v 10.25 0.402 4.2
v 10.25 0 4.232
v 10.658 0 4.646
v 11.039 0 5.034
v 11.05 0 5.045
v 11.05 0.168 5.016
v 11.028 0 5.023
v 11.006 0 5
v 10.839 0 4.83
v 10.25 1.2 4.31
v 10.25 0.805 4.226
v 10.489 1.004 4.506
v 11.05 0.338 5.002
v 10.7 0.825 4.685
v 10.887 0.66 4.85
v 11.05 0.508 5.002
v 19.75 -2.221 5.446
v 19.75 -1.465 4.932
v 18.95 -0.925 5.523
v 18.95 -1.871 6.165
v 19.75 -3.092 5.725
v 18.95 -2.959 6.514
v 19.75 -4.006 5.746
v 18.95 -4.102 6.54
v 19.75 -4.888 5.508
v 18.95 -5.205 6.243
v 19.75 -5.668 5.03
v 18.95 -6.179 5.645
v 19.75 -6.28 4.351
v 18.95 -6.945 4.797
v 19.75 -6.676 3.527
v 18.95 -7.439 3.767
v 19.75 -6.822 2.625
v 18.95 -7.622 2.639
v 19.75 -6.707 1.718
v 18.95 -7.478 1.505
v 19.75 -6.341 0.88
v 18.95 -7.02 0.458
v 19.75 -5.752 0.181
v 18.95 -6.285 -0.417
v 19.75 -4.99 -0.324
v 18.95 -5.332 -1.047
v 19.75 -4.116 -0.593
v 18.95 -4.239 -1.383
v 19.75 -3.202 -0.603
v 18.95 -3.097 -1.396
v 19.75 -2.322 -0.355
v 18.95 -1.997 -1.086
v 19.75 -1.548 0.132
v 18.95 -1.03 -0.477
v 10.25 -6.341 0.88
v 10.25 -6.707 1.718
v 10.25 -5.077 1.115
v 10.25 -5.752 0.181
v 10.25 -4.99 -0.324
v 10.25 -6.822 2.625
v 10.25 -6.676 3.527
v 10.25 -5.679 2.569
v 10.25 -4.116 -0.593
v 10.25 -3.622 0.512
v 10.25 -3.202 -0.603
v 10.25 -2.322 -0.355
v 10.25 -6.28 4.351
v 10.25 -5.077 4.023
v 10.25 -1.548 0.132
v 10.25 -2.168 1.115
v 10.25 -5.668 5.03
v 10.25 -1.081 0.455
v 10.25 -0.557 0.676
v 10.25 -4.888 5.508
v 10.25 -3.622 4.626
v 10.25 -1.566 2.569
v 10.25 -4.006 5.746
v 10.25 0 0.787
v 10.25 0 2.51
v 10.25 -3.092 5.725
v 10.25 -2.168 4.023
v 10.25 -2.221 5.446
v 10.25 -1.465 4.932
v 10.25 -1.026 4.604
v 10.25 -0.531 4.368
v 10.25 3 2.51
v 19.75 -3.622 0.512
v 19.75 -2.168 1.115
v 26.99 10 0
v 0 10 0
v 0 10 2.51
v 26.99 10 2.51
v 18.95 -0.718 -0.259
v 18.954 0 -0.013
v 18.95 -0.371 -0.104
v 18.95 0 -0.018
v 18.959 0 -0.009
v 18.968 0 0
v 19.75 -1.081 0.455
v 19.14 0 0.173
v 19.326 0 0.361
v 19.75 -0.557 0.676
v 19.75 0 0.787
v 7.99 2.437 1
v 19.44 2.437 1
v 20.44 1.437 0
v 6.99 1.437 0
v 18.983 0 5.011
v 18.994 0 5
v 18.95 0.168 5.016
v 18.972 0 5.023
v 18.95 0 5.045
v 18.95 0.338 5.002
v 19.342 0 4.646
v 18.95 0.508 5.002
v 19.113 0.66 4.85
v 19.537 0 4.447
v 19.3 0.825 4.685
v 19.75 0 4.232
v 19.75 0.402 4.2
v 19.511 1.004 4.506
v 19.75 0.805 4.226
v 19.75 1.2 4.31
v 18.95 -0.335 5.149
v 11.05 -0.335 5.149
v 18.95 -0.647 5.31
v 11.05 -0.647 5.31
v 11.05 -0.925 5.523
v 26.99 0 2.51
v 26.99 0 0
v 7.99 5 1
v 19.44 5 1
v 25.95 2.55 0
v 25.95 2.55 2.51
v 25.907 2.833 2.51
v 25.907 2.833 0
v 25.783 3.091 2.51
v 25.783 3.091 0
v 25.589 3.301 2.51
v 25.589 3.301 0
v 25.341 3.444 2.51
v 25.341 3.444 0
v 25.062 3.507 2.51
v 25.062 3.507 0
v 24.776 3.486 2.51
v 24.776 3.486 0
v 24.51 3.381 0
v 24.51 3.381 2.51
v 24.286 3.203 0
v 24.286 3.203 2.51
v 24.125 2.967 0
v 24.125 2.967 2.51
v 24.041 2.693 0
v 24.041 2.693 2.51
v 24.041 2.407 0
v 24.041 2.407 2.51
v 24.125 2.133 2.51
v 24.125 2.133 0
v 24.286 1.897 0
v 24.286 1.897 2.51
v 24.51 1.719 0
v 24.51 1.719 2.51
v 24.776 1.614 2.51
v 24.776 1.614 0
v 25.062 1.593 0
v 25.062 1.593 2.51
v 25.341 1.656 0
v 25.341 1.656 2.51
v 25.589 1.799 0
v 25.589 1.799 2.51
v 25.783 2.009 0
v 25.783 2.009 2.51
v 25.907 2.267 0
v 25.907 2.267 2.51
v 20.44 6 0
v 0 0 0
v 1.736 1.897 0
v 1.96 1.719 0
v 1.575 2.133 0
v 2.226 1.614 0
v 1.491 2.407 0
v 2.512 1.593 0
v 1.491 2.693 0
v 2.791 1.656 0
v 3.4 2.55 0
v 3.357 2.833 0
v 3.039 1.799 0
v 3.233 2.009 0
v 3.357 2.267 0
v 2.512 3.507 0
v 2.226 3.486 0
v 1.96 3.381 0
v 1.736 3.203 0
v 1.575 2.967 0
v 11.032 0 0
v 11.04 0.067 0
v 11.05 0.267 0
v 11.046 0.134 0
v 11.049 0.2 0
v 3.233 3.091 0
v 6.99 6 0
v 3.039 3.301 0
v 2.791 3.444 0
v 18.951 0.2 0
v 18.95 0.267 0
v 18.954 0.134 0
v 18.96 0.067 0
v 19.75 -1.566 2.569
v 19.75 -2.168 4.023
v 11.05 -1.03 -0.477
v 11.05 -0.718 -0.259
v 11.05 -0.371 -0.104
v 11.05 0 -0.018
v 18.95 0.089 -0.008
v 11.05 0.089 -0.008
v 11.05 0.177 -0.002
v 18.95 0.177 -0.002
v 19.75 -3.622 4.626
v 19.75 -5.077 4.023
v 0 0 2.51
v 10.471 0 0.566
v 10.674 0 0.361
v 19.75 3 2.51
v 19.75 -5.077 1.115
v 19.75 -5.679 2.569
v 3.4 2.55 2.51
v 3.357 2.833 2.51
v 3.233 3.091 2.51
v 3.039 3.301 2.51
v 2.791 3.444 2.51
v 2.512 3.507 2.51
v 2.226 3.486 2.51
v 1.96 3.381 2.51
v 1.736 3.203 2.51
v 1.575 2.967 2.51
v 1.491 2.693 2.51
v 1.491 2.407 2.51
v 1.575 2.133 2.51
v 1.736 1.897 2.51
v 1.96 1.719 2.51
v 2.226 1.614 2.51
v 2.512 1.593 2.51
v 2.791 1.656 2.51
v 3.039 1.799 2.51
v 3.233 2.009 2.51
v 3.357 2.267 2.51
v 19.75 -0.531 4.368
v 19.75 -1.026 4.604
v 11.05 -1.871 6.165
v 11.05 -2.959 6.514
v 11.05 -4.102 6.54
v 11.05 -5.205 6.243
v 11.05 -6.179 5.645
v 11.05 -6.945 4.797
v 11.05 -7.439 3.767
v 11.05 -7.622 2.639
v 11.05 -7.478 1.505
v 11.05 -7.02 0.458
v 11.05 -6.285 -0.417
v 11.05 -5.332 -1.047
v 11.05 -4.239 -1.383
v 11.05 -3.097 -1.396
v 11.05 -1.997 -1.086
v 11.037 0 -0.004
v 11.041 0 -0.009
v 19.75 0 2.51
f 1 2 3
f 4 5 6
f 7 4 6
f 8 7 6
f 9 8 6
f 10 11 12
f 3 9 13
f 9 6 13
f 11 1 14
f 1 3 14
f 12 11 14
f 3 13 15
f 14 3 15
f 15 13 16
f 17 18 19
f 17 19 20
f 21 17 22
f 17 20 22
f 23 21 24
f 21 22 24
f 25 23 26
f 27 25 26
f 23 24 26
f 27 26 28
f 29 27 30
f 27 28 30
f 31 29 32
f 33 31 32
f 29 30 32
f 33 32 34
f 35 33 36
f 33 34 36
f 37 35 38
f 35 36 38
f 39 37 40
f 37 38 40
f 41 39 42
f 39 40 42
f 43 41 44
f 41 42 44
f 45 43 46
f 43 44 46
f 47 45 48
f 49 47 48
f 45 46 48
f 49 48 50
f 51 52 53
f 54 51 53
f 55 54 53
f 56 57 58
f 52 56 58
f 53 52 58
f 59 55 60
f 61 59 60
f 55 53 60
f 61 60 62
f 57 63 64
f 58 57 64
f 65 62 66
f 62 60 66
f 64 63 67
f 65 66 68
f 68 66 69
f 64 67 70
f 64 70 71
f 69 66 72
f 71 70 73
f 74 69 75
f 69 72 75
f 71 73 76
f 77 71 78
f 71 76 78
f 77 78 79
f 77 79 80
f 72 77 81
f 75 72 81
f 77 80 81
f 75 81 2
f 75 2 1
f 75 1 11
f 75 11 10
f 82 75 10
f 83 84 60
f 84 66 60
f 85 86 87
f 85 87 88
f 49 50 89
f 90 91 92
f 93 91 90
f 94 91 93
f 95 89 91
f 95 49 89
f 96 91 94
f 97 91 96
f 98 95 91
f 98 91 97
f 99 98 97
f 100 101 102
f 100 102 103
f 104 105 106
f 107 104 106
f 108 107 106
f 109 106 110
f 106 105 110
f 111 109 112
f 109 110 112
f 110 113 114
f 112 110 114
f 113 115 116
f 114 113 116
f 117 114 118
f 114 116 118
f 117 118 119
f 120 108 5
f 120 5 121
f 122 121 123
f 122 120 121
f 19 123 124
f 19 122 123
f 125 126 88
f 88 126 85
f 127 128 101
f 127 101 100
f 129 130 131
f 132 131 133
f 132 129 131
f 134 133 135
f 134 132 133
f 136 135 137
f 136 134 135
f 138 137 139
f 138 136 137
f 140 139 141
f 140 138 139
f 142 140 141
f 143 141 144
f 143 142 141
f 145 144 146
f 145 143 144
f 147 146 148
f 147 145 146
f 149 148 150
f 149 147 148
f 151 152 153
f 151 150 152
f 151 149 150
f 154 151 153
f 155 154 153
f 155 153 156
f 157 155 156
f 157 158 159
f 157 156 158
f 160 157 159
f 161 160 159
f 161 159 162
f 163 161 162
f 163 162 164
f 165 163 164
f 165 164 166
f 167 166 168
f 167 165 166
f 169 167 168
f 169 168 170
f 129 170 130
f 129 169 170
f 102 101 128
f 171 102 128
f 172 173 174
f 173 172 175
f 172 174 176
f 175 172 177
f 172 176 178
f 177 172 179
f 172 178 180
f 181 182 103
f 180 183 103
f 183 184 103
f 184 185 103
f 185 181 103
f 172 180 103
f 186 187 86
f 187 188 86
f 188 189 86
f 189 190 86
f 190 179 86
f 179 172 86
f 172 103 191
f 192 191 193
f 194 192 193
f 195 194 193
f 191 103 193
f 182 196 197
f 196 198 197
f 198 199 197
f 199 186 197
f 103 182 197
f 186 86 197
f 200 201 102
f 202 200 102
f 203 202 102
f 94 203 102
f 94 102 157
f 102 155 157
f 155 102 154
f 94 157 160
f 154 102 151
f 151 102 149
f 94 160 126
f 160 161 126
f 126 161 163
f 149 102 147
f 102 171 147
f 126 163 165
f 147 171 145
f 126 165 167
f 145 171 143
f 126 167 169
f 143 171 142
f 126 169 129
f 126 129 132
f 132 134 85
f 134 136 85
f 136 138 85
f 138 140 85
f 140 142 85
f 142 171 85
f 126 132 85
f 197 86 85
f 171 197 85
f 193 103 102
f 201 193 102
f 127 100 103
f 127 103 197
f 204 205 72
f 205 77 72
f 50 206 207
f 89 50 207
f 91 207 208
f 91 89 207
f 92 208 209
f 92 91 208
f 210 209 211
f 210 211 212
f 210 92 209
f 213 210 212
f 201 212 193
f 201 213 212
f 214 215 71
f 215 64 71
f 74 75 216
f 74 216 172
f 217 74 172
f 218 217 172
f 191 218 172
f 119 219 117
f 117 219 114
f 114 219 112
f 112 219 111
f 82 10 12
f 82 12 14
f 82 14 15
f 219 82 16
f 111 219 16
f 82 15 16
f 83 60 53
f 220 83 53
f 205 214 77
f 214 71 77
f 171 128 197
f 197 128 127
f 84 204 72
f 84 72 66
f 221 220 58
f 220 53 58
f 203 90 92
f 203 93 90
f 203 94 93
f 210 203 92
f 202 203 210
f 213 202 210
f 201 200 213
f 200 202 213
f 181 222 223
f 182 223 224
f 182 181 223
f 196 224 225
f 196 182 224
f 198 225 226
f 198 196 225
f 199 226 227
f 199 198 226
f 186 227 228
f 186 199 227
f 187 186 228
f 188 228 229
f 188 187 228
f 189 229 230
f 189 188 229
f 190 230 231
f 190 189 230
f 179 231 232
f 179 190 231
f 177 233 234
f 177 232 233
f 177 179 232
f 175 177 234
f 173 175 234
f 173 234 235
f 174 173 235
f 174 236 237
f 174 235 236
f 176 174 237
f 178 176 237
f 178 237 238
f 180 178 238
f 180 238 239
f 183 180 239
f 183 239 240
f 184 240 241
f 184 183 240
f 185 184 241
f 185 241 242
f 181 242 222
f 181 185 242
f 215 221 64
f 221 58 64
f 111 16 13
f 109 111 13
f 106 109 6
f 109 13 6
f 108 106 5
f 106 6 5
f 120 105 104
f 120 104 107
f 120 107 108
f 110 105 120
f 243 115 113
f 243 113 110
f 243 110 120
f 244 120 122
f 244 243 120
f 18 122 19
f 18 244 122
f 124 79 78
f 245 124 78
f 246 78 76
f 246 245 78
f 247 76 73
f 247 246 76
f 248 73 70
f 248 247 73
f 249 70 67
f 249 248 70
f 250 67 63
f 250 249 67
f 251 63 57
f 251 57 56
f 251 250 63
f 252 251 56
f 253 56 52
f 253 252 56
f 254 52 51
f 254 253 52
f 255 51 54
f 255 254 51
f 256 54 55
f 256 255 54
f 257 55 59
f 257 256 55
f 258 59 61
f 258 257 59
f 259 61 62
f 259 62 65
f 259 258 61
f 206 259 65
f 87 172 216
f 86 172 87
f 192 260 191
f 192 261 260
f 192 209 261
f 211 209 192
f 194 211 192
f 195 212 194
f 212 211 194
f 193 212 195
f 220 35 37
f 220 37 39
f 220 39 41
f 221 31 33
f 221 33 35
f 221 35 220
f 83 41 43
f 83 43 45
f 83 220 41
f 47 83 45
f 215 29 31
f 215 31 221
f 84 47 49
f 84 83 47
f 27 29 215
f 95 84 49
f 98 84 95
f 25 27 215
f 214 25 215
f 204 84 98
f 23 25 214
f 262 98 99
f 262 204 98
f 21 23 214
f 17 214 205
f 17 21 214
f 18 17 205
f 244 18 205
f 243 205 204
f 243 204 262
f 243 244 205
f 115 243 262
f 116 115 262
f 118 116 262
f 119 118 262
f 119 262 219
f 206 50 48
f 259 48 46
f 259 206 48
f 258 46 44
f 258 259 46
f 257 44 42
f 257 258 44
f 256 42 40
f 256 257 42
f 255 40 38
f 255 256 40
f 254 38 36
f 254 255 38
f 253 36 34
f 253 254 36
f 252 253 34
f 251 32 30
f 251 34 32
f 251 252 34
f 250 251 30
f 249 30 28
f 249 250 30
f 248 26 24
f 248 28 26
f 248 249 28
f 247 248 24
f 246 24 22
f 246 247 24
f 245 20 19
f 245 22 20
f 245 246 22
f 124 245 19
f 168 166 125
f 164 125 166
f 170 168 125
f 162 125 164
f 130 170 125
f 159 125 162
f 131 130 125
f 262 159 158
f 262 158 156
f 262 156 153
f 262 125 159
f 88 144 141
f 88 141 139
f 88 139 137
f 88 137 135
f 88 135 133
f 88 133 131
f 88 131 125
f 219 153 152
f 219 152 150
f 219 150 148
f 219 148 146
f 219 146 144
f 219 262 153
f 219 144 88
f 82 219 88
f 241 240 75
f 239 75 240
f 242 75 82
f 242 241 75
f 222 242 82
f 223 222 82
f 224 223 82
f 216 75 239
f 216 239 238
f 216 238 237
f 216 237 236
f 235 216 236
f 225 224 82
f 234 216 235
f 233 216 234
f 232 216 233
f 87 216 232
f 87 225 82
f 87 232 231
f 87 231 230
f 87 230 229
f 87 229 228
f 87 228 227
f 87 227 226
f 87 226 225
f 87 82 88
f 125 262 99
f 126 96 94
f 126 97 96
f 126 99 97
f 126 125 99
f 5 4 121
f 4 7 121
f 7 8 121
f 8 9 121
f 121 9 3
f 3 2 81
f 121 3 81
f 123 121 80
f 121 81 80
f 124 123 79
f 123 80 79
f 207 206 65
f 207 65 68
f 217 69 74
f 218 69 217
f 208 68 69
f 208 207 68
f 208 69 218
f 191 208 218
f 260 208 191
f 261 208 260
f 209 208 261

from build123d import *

# Parameters (mm, degrees)
SKETCH1_W           = 26.99
SKETCH1_H           = 10
SKETCH1_R           = 0.96
BOSS_EXTRUDE1_DEPTH = 5
SKETCH3_R           = 4
BOSS_EXTRUDE2_DEPTH = 4.75
FILLET1_R           = 2
FILLET2_R           = 2
CHAMFER1_SIZE       = 0.8
SKETCH6_W           = 3.842122027
SKETCH6_H           = 10
CUT_EXTRUDE1_DEPTH  = 41
CHAMFER3_START      = 10.25
CHAMFER3_DEPTH      = 9.5
SKETCH7_W           = 13.45
SKETCH7_H           = 4.563034457
CUT_EXTRUDE2_DEPTH  = 1
CHAMFER5_SIZE       = 1


with BuildPart() as part:
    # Sketch1 → Boss-Extrude1 (new body)
    with BuildSketch(Plane.XY):
        with Locations((13.495, 5)):
            Rectangle(SKETCH1_W, SKETCH1_H)
        with Locations((2.44, 2.55)):
            Circle(SKETCH1_R, mode=Mode.SUBTRACT)
        with Locations((24.99, 2.55)):
            Circle(SKETCH1_R, mode=Mode.SUBTRACT)
    extrude(amount=BOSS_EXTRUDE1_DEPTH)

    # Sketch3 → Boss-Extrude2 (add, symmetric)
    with BuildSketch(Plane.ZY.offset(-15)):
        with Locations((2.568998912, -3.622468738)):
            Circle(SKETCH3_R)
        Polygon((0.512453731, -3.622468738), (1.114801869, -5.076665781), (2.568998912, -5.679013919), (4.023195955, -5.076665781), (4.625544092, -3.622468738), (4.023195955, -2.168271695), (2.568998912, -1.565923558), (1.114801869, -2.168271695), align=None, mode=Mode.SUBTRACT)
    extrude(amount=BOSS_EXTRUDE2_DEPTH, both=True)

    # Fillet1
    # the kernel refuses this fillet: 2 mm, written as the material it adds along each edge
    with BuildSketch(Plane(origin=(19.75, 0, 0.872614451), x_dir=(0, 0, -1), z_dir=(-1, 0, 0))) as fillet1_piece_1:
        with BuildLine():
            CenterArc((2.851261839, -0.291469576), FILLET1_R, 139.283020083, 32.337148469)
            ThreePointArc((1.335379739, 1.013176529), (0.721358104, 0.435852839), (0, 0))
            Line((0, 0), (0.872614451, 0))
        make_face()
    extrude(amount=9.5)
    with BuildSketch(Plane(origin=(19.75, 0, 4.265383373), x_dir=(0, 0, 1), z_dir=(-1, 0, 0))) as fillet1_piece_2:
        with BuildLine():
            CenterArc((2.674069858, 0.488386288), FILLET1_R, 194.13415607, 29.112659272)
            ThreePointArc((1.217251752, -0.881898721), (0.650423795, -0.383257259), (0, 0))
            Line((0, 0), (0.734616627, 0))
        make_face()
    extrude(amount=9.5)

    # Fillet2
    # the kernel refuses this fillet: 2 mm, written as the material it adds along each edge
    with BuildSketch(Plane(origin=(19.75, 0, 0), x_dir=(0, 1, 0), z_dir=(-1, 0, 0))) as fillet2_piece_1:
        with BuildLine():
            CenterArc((0.266521997, 2), FILLET2_R, 229.596597584, 40.403402416)
            Line((-1.029808248, 0.477000363), (-1.159441272, 0.324700399))
            ThreePointArc((-1.159441272, 0.324700399), (-1.143641139, 0.311177078), (-0.029146958, -0.197864739))
            Line((-0.029146958, -0.197864739), (0, -0.2))
            Line((0, -0.2), (0.266521997, -0.2))
            Line((0.266521997, -0.2), (0.266521997, 0))
        make_face()
    extrude(amount=9.5)
    with BuildSketch(Plane(origin=(19.75, 0, 5), x_dir=(0, -0.870596677984774, 0.491997382393317), z_dir=(-1, 0, 0))) as fillet2_piece_2:
        with BuildLine():
            CenterArc((0.615688034, 1.949333304), FILLET2_R, 240.528051524, 42.396189725)
            Line((-0.368306731, 0.208139948), (-0.466706207, 0.034020613))
            Line((-0.466706207, 0.034020613), (-0.098399476, -0.174119336))
            Line((-0.098399476, -0.174119336), (-0.052901843, -0.192876631))
            ThreePointArc((-0.052901843, -0.192876631), (1.052854803, -0.20795909), (1.10774555, -0.19493333))
            Line((1.10774555, -0.19493333), (1.063013048, 0))
        make_face()
    extrude(amount=9.5)

    # Chamfer1
    # the kernel refuses this chamfer: 0.8 mm, written as the material it takes off along each edge
    with BuildSketch(Plane(origin=(19.75, 0.266521997, -2), x_dir=(0, -0.648165122631187, 0.7614998186503384), z_dir=(0, -0.7614998186503384, -0.648165122631187))) as chamfer1_piece_1_section:
        Polygon((2, CHAMFER1_SIZE), (2 + CHAMFER1_SIZE, 0), (2, 0), align=None)
    chamfer1_piece_1 = revolve(axis=Axis((19.75, 0.266521997, -2), (-1, 0, 0)), revolution_arc=99.346805501, mode=Mode.PRIVATE)
    chamfer1_piece_1 = split(chamfer1_piece_1, bisect_by=Plane(origin=(19.75, 0, -2), z_dir=(0, -1, 0)), keep=Keep.TOP, mode=Mode.PRIVATE)
    add(chamfer1_piece_1, mode=Mode.SUBTRACT)
    with BuildSketch(Plane(origin=(19.75, 0.266521997, -2), x_dir=(0, -0.648165122631187, 0.7614998186503384), z_dir=(0, -0.7614998186503384, -0.648165122631187))) as chamfer1_piece_2_section:
        Polygon((2, CHAMFER1_SIZE), (2 + CHAMFER1_SIZE, 0), (2, 0), align=None)
    chamfer1_piece_2 = revolve(axis=Axis((19.75, 0.266521997, -2), (-1, 0, 0)), revolution_arc=99.346805501, mode=Mode.PRIVATE)
    chamfer1_piece_2 = split(chamfer1_piece_2, bisect_by=Plane(origin=(19.75, 0.266521997, 0), z_dir=(0, 0, -1)), keep=Keep.TOP, mode=Mode.PRIVATE)
    add(chamfer1_piece_2, mode=Mode.SUBTRACT)
    with BuildSketch(Plane(origin=(19.75, 0.423050926, 7), x_dir=(0, 0.8566624684959867, -0.515877325602088), z_dir=(0, 0.515877325602088, 0.8566624684959867))) as chamfer1_piece_3_section:
        Polygon((2, CHAMFER1_SIZE), (2 + CHAMFER1_SIZE, 0), (2, 0), align=None)
    chamfer1_piece_3 = revolve(axis=Axis((19.75, 0.423050926, 7), (-1, 0, 0)), revolution_arc=101.340075028, mode=Mode.PRIVATE)
    chamfer1_piece_3 = split(chamfer1_piece_3, bisect_by=Plane(origin=(19.75, 0, 7), z_dir=(0, -1, 0)), keep=Keep.TOP, mode=Mode.PRIVATE)
    add(chamfer1_piece_3, mode=Mode.SUBTRACT)
    with BuildSketch(Plane(origin=(19.75, 0.423050926, 7), x_dir=(0, 0.8566624684959867, -0.515877325602088), z_dir=(0, 0.515877325602088, 0.8566624684959867))) as chamfer1_piece_4_section:
        Polygon((2, CHAMFER1_SIZE), (2 + CHAMFER1_SIZE, 0), (2, 0), align=None)
    chamfer1_piece_4 = revolve(axis=Axis((19.75, 0.423050926, 7), (-1, 0, 0)), revolution_arc=101.340075028, mode=Mode.PRIVATE)
    chamfer1_piece_4 = split(chamfer1_piece_4, bisect_by=Plane(origin=(19.75, 0.423050926, 5), z_dir=(0, 0, 1)), keep=Keep.TOP, mode=Mode.PRIVATE)
    add(chamfer1_piece_4, mode=Mode.SUBTRACT)
    with BuildSketch(Plane(origin=(19.75, -3.622468738, 2.568998912), x_dir=(0, 0.6742532774459821, 0.7385001813495726), z_dir=(0, 0.7385001813495726, -0.6742532774459821))) as chamfer1_piece_5:
        Polygon((4 - CHAMFER1_SIZE, 0), (4, -CHAMFER1_SIZE), (4, 0), align=None)
    revolve(axis=Axis((19.75, -3.622468738, 2.568998912), (1, 0, 0)), revolution_arc=262.799592141, mode=Mode.SUBTRACT)
    with BuildSketch(Plane(origin=(10.25, 0.266521997, -2), x_dir=(0, -0.648165122631187, 0.7614998186503384), z_dir=(0, -0.7614998186503384, -0.648165122631187))) as chamfer1_piece_6_section:
        Polygon((2 + CHAMFER1_SIZE, 0), (2, -CHAMFER1_SIZE), (2, 0), align=None)
    chamfer1_piece_6 = revolve(axis=Axis((10.25, 0.266521997, -2), (-1, 0, 0)), revolution_arc=99.346805501, mode=Mode.PRIVATE)
    chamfer1_piece_6 = split(chamfer1_piece_6, bisect_by=Plane(origin=(10.25, 0, -2), z_dir=(0, -1, 0)), keep=Keep.TOP, mode=Mode.PRIVATE)
    add(chamfer1_piece_6, mode=Mode.SUBTRACT)
    with BuildSketch(Plane(origin=(10.25, 0.266521997, -2), x_dir=(0, -0.648165122631187, 0.7614998186503384), z_dir=(0, -0.7614998186503384, -0.648165122631187))) as chamfer1_piece_7_section:
        Polygon((2 + CHAMFER1_SIZE, 0), (2, -CHAMFER1_SIZE), (2, 0), align=None)
    chamfer1_piece_7 = revolve(axis=Axis((10.25, 0.266521997, -2), (-1, 0, 0)), revolution_arc=99.346805501, mode=Mode.PRIVATE)
    chamfer1_piece_7 = split(chamfer1_piece_7, bisect_by=Plane(origin=(10.25, 0.266521997, 0), z_dir=(0, 0, -1)), keep=Keep.TOP, mode=Mode.PRIVATE)
    add(chamfer1_piece_7, mode=Mode.SUBTRACT)
    with BuildSketch(Plane(origin=(10.25, 0.423050926, 7), x_dir=(0, 0.8566624684959867, -0.515877325602088), z_dir=(0, 0.515877325602088, 0.8566624684959867))) as chamfer1_piece_8_section:
        Polygon((2, -CHAMFER1_SIZE), (2 + CHAMFER1_SIZE, 0), (2, 0), align=None)
    chamfer1_piece_8 = revolve(axis=Axis((10.25, 0.423050926, 7), (-1, 0, 0)), revolution_arc=101.340075028, mode=Mode.PRIVATE)
    chamfer1_piece_8 = split(chamfer1_piece_8, bisect_by=Plane(origin=(10.25, 0, 7), z_dir=(0, -1, 0)), keep=Keep.TOP, mode=Mode.PRIVATE)
    add(chamfer1_piece_8, mode=Mode.SUBTRACT)
    with BuildSketch(Plane(origin=(10.25, 0.423050926, 7), x_dir=(0, 0.8566624684959867, -0.515877325602088), z_dir=(0, 0.515877325602088, 0.8566624684959867))) as chamfer1_piece_9_section:
        Polygon((2, -CHAMFER1_SIZE), (2 + CHAMFER1_SIZE, 0), (2, 0), align=None)
    chamfer1_piece_9 = revolve(axis=Axis((10.25, 0.423050926, 7), (-1, 0, 0)), revolution_arc=101.340075028, mode=Mode.PRIVATE)
    chamfer1_piece_9 = split(chamfer1_piece_9, bisect_by=Plane(origin=(10.25, 0.423050926, 5), z_dir=(0, 0, 1)), keep=Keep.TOP, mode=Mode.PRIVATE)
    add(chamfer1_piece_9, mode=Mode.SUBTRACT)
    with BuildSketch(Plane(origin=(10.25, -3.622468738, 2.568998912), x_dir=(0, 0.6742532774459821, 0.7385001813495726), z_dir=(0, 0.7385001813495726, -0.6742532774459821))) as chamfer1_piece_10:
        Polygon((4 - CHAMFER1_SIZE, 0), (4, CHAMFER1_SIZE), (4, 0), align=None)
    revolve(axis=Axis((10.25, -3.622468738, 2.568998912), (1, 0, 0)), revolution_arc=262.799592141, mode=Mode.SUBTRACT)

    # Sketch6 → Cut-Extrude1 (cut)
    with BuildSketch(Plane(origin=(0, 0, 0), x_dir=(0, 0, -1), z_dir=(1, 0, 0))):
        with Locations((-4.430776166, 5)):
            Rectangle(SKETCH6_W, SKETCH6_H)
    extrude(amount=CUT_EXTRUDE1_DEPTH, mode=Mode.SUBTRACT)

    # Chamfer3: read off the stored shape, not the designer's step
    # Chamfer3 outline → Chamfer3 (add)
    with BuildSketch(Plane.YZ.offset(CHAMFER3_START)):
        with BuildLine():
            ThreePointArc((0.507913909, 5.001801243), (0.252566824, 5.007279455), (0, 5.045255026))
            Line((0, 5.045255026), (0, 2.509715152))
            Line((0, 2.509715152), (3, 2.509715152))
            Line((3, 2.509715152), (0.507913909, 5.001801243))
        make_face()
    extrude(amount=CHAMFER3_DEPTH)

    # Chamfer3 2 outline → Chamfer3 2 (revolve, cut)
    with BuildSketch(Plane(origin=(0, 0.423050926, 7), x_dir=(0, 1, 0), z_dir=(0, 0, -1))):
        Polygon((2, 19.75), (2, 18.95), (2.8, 19.75), align=None)
        Polygon((2.8, 10.25), (2, 11.05), (2, 10.25), align=None)
    revolve(axis=Axis((0, 0.423050926, 7), (1, 0, 0)), mode=Mode.SUBTRACT)

    # Sketch7 → Cut-Extrude2 (cut)
    with BuildSketch(Plane(origin=(0, 0, 0), x_dir=(-1, 0, 0), z_dir=(0, 0, -1))):
        with Locations((-13.715, 3.718482772)):
            Rectangle(SKETCH7_W, SKETCH7_H)
    extrude(amount=-CUT_EXTRUDE2_DEPTH, mode=Mode.SUBTRACT)

    # Chamfer5
    chamfer5_edges = [part.edges().sort_by_distance(p)[0] for p in [
        (13.715, 6, 1),
        (6.99, 3.718482772, 1),
        (13.715, 1.436965543, 1),
        (20.44, 3.718482772, 1),
    ]]
    chamfer(chamfer5_edges, length=CHAMFER5_SIZE - 0.0001)  # a hair under: the kernel refuses the full size


solid = part.part
